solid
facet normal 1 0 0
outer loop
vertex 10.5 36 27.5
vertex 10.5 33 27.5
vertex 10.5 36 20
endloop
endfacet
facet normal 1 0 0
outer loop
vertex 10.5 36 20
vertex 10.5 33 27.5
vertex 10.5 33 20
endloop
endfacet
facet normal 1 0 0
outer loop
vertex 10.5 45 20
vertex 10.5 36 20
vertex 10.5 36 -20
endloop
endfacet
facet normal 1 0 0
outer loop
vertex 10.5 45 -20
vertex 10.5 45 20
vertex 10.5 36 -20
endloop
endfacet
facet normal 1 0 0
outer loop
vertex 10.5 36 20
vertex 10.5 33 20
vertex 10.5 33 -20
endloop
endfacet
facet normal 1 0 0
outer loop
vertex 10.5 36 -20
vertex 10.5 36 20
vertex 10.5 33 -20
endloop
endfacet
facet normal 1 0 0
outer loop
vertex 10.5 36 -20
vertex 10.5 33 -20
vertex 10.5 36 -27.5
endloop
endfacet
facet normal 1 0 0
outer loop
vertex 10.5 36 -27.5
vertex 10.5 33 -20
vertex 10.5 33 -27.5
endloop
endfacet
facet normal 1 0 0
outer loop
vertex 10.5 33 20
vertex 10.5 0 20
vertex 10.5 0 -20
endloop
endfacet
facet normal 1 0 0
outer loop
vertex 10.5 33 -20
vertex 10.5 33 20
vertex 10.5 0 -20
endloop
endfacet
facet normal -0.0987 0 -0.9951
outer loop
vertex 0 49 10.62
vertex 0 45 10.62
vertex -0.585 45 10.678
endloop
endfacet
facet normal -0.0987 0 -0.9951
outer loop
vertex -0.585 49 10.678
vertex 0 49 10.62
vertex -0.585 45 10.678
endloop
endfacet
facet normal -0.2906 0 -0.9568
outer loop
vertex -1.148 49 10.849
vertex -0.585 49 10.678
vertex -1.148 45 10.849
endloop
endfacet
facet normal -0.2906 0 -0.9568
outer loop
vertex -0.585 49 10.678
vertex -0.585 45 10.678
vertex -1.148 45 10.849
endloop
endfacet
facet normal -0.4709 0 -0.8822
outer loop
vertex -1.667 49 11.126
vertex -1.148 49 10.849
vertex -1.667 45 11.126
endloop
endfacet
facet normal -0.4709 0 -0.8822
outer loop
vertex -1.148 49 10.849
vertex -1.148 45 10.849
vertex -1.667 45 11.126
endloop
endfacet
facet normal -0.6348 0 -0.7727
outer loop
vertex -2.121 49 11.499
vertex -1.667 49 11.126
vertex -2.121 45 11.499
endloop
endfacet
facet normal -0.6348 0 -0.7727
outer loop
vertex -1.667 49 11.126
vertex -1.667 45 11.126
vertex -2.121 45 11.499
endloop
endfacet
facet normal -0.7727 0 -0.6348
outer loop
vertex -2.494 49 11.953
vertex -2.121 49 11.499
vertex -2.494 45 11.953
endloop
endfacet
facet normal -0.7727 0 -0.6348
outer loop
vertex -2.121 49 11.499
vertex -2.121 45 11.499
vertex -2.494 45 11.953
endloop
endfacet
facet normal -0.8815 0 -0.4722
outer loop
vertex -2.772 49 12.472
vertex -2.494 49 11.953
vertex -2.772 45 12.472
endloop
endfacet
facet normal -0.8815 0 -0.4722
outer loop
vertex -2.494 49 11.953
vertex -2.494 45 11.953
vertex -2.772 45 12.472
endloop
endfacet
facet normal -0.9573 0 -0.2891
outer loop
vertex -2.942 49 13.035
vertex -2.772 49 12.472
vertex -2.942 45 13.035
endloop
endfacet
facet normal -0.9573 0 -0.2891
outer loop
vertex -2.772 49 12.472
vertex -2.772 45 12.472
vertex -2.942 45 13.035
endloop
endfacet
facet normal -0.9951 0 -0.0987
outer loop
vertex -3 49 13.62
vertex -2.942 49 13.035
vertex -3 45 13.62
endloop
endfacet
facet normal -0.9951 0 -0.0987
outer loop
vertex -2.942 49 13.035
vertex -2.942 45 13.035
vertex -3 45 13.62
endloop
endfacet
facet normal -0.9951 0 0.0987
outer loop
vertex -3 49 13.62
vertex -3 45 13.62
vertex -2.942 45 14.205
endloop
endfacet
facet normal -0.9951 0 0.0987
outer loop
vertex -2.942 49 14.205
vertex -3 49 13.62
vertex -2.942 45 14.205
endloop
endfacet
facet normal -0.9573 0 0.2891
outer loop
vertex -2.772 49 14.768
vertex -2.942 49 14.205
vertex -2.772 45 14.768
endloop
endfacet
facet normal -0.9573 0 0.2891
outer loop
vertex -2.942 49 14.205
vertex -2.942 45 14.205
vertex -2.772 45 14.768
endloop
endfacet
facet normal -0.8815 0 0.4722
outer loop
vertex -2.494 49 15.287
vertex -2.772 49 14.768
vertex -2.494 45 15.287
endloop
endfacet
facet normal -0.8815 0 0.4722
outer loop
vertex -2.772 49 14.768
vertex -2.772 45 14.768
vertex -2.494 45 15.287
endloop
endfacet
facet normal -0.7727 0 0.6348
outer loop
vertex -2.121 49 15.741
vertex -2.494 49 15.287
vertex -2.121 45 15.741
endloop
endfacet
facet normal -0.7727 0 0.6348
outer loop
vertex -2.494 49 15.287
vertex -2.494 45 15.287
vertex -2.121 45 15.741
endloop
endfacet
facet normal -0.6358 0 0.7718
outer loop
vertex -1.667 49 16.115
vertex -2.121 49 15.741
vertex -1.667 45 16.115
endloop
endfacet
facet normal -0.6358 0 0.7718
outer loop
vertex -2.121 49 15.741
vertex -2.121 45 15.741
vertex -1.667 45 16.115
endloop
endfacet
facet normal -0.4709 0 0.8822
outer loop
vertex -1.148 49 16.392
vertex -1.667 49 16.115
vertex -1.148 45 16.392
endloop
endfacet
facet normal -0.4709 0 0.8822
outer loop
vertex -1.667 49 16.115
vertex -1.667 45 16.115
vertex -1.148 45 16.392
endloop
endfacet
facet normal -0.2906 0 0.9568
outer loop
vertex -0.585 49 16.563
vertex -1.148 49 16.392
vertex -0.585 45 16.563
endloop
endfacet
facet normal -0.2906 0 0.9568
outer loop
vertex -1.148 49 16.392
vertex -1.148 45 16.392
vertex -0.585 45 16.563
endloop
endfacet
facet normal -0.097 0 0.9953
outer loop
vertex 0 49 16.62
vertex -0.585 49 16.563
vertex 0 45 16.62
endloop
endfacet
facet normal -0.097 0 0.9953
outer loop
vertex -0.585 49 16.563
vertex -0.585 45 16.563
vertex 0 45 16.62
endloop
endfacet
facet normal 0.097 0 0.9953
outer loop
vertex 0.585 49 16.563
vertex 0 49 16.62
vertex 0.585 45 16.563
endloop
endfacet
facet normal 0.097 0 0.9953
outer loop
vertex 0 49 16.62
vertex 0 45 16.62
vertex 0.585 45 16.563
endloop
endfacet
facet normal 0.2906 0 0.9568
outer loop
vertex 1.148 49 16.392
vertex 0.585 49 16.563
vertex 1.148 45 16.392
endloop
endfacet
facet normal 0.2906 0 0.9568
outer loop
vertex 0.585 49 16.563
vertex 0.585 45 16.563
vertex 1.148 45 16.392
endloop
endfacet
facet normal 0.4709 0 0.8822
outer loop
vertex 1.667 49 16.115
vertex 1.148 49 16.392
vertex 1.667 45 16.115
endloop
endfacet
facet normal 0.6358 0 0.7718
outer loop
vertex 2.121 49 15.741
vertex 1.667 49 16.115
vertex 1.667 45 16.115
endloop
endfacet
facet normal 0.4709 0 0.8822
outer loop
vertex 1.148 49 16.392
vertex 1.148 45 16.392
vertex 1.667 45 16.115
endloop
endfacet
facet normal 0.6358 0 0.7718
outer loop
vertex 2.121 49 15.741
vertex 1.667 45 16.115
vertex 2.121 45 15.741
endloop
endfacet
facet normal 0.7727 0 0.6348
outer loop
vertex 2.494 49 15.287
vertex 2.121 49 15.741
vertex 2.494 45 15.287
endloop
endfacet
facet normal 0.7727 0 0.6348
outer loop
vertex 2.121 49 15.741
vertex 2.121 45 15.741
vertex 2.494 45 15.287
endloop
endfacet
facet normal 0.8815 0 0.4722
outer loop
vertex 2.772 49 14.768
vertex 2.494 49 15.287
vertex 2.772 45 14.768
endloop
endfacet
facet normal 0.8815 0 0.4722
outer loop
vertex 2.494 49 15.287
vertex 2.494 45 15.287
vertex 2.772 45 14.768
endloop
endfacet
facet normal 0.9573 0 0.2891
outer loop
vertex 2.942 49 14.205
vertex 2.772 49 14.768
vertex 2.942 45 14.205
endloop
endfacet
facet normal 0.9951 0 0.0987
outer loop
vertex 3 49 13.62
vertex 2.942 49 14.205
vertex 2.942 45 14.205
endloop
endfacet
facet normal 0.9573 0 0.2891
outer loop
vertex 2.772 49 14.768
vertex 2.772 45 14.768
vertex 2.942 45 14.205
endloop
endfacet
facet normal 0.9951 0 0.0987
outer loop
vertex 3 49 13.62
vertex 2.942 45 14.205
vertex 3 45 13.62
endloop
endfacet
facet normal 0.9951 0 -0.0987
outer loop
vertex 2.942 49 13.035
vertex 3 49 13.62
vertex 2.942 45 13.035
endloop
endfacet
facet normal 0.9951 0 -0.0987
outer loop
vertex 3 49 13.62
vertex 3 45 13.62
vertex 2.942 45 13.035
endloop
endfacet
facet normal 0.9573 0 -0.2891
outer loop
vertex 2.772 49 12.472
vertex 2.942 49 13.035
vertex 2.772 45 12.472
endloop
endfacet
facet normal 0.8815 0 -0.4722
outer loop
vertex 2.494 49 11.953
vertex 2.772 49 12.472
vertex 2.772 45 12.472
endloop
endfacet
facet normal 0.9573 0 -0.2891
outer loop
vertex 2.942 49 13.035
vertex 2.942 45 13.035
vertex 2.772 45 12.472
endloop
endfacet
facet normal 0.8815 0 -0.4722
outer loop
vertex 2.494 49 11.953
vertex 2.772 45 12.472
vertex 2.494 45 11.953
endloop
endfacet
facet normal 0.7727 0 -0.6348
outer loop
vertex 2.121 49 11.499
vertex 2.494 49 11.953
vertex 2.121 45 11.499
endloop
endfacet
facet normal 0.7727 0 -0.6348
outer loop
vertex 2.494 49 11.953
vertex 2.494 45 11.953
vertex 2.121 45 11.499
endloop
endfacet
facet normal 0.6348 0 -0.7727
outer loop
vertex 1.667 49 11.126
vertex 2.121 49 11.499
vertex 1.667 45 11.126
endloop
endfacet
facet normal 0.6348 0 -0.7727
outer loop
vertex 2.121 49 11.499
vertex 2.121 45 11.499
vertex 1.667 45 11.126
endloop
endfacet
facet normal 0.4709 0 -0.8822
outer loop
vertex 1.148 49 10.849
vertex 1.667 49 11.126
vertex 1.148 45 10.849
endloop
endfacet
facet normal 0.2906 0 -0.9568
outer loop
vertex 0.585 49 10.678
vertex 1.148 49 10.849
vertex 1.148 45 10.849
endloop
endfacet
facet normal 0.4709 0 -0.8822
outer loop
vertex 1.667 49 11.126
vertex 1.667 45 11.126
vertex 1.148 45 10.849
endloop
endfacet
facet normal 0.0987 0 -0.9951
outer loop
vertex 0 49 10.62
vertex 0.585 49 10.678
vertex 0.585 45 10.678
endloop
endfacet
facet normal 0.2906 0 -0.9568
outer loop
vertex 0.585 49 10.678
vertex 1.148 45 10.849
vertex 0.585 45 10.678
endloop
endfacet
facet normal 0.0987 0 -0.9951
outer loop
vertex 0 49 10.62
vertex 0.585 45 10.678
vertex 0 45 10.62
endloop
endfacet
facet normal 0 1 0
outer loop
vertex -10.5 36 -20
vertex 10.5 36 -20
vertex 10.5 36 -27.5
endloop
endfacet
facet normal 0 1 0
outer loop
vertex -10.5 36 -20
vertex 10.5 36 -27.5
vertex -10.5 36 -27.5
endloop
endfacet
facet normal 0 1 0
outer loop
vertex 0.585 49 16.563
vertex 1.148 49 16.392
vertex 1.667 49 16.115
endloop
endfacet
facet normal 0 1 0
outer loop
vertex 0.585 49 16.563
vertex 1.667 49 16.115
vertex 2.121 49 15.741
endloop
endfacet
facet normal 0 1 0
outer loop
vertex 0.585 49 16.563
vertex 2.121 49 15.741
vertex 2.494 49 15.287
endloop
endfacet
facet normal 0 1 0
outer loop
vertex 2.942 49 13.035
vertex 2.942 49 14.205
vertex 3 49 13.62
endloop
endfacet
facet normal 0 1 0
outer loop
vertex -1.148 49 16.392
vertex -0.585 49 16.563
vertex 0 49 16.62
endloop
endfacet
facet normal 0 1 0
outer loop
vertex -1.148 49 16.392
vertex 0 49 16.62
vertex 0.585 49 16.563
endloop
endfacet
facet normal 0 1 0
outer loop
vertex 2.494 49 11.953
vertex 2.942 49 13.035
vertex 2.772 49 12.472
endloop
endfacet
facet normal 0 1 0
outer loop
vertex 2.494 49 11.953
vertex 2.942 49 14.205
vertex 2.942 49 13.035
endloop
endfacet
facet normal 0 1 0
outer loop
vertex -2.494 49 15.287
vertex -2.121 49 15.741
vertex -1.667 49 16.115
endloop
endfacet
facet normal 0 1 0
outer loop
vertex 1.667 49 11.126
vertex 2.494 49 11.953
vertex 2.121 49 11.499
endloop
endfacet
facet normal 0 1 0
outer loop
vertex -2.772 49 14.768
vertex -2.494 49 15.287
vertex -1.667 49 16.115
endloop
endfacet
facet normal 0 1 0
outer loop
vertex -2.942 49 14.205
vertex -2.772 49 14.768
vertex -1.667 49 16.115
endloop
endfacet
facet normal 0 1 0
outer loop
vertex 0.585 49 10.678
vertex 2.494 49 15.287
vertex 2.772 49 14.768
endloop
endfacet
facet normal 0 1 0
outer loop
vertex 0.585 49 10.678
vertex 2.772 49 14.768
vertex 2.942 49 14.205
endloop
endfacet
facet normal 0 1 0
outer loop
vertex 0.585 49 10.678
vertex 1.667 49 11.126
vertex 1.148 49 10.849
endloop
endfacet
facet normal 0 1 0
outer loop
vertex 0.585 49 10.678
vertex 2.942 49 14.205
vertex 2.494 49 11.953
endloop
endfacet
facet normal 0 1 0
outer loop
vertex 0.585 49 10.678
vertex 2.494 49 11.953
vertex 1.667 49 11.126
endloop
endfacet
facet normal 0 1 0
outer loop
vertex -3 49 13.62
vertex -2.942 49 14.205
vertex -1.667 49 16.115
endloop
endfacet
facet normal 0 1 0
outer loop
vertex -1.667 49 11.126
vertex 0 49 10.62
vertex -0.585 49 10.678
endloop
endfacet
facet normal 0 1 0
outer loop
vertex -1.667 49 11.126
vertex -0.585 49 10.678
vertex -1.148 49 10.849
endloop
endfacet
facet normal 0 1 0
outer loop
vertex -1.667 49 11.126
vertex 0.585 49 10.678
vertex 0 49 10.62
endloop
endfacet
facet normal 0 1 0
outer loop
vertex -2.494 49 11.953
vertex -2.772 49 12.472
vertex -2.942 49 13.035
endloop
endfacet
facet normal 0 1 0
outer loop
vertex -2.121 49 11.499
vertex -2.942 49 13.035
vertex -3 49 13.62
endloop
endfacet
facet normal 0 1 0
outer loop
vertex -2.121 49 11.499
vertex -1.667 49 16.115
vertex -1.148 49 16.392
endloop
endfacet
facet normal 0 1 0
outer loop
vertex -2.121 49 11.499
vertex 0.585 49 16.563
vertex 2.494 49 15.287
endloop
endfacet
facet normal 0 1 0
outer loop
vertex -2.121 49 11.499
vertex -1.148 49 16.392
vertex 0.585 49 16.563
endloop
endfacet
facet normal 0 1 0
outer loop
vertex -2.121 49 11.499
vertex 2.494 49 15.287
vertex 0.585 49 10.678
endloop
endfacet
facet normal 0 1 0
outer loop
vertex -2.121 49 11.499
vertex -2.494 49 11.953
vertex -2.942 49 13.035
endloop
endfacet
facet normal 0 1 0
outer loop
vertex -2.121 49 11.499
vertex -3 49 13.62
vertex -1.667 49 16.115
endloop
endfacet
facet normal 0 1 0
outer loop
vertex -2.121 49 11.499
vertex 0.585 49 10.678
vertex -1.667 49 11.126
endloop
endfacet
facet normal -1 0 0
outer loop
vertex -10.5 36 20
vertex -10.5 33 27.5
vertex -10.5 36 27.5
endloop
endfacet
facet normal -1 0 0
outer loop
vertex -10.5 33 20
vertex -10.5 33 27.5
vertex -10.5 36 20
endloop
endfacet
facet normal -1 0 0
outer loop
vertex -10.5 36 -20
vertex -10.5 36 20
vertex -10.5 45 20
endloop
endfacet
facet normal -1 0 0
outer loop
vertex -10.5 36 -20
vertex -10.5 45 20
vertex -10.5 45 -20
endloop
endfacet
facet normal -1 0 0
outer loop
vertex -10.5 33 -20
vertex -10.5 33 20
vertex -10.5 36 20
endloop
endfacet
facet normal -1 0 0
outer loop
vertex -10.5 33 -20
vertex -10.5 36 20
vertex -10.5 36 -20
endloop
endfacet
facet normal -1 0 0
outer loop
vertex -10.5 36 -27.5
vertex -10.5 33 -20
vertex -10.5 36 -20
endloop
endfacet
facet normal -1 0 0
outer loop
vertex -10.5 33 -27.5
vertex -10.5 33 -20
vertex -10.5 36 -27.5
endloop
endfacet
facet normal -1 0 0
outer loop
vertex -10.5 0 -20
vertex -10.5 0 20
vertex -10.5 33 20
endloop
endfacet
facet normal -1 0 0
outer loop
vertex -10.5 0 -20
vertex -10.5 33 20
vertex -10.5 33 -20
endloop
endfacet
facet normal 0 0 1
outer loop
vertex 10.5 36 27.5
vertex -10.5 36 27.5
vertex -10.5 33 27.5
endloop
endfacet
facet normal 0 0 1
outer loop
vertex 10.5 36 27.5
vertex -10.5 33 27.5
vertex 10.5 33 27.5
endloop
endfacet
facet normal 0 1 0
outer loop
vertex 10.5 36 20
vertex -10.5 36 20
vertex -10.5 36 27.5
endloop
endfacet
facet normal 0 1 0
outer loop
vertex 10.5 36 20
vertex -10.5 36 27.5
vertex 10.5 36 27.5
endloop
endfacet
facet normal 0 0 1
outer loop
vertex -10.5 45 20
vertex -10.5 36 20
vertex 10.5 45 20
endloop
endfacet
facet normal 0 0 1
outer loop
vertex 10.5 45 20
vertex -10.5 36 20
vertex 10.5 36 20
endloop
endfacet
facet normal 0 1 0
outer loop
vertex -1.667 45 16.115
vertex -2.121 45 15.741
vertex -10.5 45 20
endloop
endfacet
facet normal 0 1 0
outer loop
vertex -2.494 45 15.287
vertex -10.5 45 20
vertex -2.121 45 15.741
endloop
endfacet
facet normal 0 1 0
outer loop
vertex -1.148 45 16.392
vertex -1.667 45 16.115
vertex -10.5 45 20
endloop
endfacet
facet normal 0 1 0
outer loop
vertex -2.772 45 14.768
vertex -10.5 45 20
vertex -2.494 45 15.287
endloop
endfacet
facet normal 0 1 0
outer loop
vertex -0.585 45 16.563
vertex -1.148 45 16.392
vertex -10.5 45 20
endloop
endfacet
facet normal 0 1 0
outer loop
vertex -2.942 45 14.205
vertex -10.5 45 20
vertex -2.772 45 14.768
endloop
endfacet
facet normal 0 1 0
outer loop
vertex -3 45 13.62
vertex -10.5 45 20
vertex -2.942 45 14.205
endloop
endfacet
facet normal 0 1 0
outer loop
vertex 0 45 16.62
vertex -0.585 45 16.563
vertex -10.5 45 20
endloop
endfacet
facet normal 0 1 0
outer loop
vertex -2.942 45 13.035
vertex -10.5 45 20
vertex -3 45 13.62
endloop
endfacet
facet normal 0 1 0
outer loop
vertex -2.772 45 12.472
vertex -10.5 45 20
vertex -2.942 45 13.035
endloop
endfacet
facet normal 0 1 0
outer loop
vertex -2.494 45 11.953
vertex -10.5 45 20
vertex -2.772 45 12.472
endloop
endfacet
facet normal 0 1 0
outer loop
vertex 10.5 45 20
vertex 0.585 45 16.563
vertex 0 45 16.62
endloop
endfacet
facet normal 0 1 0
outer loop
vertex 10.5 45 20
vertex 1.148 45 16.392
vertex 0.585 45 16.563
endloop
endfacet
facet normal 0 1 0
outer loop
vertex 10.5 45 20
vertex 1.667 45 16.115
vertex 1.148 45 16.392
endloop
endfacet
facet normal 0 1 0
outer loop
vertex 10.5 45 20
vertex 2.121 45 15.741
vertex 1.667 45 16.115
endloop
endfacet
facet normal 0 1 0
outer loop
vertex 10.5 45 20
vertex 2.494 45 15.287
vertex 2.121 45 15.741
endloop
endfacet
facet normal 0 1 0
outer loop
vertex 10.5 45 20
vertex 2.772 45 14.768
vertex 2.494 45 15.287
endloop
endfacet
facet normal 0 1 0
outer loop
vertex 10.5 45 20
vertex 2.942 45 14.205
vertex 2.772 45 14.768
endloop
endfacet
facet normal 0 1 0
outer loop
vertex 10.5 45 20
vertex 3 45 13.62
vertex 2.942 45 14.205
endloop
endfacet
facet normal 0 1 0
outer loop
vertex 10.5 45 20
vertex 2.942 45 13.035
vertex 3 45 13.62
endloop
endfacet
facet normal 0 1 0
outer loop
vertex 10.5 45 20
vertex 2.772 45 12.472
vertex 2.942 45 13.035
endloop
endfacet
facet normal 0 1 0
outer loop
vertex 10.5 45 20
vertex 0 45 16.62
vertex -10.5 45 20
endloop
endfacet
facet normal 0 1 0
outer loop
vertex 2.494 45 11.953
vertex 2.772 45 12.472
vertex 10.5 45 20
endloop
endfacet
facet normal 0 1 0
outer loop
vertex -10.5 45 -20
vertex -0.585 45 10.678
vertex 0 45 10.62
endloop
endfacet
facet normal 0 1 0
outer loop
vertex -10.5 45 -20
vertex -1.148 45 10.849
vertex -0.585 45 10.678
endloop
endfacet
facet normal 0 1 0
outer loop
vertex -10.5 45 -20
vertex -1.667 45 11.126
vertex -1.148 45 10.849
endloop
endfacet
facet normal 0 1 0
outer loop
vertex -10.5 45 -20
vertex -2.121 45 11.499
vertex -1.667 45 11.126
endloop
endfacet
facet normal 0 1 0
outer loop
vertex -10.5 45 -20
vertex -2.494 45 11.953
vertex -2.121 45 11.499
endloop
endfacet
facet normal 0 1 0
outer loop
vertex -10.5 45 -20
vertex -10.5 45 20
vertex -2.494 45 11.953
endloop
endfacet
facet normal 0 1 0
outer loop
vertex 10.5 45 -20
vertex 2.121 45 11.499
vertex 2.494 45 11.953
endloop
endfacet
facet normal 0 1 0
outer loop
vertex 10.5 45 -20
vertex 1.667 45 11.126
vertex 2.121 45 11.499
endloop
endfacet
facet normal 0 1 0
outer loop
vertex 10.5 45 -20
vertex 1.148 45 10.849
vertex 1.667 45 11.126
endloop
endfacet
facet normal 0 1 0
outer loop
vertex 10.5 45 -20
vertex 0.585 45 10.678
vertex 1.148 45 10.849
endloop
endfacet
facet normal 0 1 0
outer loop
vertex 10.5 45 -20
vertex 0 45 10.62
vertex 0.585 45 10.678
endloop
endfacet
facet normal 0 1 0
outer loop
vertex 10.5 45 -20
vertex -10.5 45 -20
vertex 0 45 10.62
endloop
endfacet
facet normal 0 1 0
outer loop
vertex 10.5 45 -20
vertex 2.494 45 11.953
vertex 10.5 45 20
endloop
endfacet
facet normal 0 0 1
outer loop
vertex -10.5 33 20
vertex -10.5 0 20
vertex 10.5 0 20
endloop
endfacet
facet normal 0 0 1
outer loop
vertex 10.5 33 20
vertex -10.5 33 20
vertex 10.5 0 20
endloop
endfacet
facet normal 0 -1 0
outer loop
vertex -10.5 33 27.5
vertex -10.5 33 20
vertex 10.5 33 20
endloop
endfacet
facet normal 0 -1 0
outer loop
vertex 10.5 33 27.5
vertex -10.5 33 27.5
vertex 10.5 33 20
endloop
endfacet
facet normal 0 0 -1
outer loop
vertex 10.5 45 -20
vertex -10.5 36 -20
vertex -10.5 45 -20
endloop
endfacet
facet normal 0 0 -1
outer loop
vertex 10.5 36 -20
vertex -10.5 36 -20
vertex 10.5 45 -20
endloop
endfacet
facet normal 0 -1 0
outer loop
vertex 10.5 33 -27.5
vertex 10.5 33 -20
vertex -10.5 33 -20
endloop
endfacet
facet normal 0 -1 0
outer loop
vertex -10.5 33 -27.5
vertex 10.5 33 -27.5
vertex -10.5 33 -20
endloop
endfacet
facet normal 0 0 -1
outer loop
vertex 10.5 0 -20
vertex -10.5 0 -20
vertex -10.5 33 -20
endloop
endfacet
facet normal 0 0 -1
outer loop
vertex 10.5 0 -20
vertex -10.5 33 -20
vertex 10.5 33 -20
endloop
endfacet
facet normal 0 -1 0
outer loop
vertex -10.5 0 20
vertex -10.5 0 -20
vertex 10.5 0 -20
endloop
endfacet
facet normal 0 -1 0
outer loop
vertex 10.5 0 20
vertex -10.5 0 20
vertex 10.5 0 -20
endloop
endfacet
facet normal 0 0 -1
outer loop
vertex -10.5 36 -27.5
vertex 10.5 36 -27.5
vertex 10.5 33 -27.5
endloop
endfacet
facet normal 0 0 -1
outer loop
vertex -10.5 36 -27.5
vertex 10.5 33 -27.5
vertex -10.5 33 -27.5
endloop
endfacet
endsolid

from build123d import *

# Parameters (mm, degrees)
SKETCH1_W           = 21
SKETCH1_H           = 40
BOSS_EXTRUDE1_DEPTH = 45
SKETCH2_W           = 21
SKETCH2_H           = 3
BOSS_EXTRUDE2_DEPTH = 7.5
SKETCH3_W           = 21
SKETCH3_H           = 3
BOSS_EXTRUDE3_DEPTH = 7.5
SKETCH5_R           = 3
BOSS_EXTRUDE4_DEPTH = 4


with BuildPart() as part:
    # Sketch1 → Boss-Extrude1 (new body)
    with BuildSketch(Plane(origin=(0, 0, 0), x_dir=(1, 0, 0), z_dir=(0, 1, 0))):
        Rectangle(SKETCH1_W, SKETCH1_H)
    extrude(amount=BOSS_EXTRUDE1_DEPTH)

    # Sketch2 → Boss-Extrude2 (add)
    with BuildSketch(Plane.XY.offset(20)):
        with Locations((0, 34.5)):
            Rectangle(SKETCH2_W, SKETCH2_H)
    extrude(amount=BOSS_EXTRUDE2_DEPTH)

    # Sketch3 → Boss-Extrude3 (add)
    with BuildSketch(Plane(origin=(0, 0, -20), x_dir=(-1, 0, 0), z_dir=(0, 0, -1))):
        with Locations((0, 34.5)):
            Rectangle(SKETCH3_W, SKETCH3_H)
    extrude(amount=BOSS_EXTRUDE3_DEPTH)

    # Sketch5 → Boss-Extrude4 (add)
    with BuildSketch(Plane(origin=(0, 45, 0), x_dir=(1, 0, 0), z_dir=(0, 1, 0))):
        with Locations(Location((0, -13.620158604, 0), (0, 0, 90))):
            Circle(SKETCH5_R)
    extrude(amount=BOSS_EXTRUDE4_DEPTH)


solid = part.part
